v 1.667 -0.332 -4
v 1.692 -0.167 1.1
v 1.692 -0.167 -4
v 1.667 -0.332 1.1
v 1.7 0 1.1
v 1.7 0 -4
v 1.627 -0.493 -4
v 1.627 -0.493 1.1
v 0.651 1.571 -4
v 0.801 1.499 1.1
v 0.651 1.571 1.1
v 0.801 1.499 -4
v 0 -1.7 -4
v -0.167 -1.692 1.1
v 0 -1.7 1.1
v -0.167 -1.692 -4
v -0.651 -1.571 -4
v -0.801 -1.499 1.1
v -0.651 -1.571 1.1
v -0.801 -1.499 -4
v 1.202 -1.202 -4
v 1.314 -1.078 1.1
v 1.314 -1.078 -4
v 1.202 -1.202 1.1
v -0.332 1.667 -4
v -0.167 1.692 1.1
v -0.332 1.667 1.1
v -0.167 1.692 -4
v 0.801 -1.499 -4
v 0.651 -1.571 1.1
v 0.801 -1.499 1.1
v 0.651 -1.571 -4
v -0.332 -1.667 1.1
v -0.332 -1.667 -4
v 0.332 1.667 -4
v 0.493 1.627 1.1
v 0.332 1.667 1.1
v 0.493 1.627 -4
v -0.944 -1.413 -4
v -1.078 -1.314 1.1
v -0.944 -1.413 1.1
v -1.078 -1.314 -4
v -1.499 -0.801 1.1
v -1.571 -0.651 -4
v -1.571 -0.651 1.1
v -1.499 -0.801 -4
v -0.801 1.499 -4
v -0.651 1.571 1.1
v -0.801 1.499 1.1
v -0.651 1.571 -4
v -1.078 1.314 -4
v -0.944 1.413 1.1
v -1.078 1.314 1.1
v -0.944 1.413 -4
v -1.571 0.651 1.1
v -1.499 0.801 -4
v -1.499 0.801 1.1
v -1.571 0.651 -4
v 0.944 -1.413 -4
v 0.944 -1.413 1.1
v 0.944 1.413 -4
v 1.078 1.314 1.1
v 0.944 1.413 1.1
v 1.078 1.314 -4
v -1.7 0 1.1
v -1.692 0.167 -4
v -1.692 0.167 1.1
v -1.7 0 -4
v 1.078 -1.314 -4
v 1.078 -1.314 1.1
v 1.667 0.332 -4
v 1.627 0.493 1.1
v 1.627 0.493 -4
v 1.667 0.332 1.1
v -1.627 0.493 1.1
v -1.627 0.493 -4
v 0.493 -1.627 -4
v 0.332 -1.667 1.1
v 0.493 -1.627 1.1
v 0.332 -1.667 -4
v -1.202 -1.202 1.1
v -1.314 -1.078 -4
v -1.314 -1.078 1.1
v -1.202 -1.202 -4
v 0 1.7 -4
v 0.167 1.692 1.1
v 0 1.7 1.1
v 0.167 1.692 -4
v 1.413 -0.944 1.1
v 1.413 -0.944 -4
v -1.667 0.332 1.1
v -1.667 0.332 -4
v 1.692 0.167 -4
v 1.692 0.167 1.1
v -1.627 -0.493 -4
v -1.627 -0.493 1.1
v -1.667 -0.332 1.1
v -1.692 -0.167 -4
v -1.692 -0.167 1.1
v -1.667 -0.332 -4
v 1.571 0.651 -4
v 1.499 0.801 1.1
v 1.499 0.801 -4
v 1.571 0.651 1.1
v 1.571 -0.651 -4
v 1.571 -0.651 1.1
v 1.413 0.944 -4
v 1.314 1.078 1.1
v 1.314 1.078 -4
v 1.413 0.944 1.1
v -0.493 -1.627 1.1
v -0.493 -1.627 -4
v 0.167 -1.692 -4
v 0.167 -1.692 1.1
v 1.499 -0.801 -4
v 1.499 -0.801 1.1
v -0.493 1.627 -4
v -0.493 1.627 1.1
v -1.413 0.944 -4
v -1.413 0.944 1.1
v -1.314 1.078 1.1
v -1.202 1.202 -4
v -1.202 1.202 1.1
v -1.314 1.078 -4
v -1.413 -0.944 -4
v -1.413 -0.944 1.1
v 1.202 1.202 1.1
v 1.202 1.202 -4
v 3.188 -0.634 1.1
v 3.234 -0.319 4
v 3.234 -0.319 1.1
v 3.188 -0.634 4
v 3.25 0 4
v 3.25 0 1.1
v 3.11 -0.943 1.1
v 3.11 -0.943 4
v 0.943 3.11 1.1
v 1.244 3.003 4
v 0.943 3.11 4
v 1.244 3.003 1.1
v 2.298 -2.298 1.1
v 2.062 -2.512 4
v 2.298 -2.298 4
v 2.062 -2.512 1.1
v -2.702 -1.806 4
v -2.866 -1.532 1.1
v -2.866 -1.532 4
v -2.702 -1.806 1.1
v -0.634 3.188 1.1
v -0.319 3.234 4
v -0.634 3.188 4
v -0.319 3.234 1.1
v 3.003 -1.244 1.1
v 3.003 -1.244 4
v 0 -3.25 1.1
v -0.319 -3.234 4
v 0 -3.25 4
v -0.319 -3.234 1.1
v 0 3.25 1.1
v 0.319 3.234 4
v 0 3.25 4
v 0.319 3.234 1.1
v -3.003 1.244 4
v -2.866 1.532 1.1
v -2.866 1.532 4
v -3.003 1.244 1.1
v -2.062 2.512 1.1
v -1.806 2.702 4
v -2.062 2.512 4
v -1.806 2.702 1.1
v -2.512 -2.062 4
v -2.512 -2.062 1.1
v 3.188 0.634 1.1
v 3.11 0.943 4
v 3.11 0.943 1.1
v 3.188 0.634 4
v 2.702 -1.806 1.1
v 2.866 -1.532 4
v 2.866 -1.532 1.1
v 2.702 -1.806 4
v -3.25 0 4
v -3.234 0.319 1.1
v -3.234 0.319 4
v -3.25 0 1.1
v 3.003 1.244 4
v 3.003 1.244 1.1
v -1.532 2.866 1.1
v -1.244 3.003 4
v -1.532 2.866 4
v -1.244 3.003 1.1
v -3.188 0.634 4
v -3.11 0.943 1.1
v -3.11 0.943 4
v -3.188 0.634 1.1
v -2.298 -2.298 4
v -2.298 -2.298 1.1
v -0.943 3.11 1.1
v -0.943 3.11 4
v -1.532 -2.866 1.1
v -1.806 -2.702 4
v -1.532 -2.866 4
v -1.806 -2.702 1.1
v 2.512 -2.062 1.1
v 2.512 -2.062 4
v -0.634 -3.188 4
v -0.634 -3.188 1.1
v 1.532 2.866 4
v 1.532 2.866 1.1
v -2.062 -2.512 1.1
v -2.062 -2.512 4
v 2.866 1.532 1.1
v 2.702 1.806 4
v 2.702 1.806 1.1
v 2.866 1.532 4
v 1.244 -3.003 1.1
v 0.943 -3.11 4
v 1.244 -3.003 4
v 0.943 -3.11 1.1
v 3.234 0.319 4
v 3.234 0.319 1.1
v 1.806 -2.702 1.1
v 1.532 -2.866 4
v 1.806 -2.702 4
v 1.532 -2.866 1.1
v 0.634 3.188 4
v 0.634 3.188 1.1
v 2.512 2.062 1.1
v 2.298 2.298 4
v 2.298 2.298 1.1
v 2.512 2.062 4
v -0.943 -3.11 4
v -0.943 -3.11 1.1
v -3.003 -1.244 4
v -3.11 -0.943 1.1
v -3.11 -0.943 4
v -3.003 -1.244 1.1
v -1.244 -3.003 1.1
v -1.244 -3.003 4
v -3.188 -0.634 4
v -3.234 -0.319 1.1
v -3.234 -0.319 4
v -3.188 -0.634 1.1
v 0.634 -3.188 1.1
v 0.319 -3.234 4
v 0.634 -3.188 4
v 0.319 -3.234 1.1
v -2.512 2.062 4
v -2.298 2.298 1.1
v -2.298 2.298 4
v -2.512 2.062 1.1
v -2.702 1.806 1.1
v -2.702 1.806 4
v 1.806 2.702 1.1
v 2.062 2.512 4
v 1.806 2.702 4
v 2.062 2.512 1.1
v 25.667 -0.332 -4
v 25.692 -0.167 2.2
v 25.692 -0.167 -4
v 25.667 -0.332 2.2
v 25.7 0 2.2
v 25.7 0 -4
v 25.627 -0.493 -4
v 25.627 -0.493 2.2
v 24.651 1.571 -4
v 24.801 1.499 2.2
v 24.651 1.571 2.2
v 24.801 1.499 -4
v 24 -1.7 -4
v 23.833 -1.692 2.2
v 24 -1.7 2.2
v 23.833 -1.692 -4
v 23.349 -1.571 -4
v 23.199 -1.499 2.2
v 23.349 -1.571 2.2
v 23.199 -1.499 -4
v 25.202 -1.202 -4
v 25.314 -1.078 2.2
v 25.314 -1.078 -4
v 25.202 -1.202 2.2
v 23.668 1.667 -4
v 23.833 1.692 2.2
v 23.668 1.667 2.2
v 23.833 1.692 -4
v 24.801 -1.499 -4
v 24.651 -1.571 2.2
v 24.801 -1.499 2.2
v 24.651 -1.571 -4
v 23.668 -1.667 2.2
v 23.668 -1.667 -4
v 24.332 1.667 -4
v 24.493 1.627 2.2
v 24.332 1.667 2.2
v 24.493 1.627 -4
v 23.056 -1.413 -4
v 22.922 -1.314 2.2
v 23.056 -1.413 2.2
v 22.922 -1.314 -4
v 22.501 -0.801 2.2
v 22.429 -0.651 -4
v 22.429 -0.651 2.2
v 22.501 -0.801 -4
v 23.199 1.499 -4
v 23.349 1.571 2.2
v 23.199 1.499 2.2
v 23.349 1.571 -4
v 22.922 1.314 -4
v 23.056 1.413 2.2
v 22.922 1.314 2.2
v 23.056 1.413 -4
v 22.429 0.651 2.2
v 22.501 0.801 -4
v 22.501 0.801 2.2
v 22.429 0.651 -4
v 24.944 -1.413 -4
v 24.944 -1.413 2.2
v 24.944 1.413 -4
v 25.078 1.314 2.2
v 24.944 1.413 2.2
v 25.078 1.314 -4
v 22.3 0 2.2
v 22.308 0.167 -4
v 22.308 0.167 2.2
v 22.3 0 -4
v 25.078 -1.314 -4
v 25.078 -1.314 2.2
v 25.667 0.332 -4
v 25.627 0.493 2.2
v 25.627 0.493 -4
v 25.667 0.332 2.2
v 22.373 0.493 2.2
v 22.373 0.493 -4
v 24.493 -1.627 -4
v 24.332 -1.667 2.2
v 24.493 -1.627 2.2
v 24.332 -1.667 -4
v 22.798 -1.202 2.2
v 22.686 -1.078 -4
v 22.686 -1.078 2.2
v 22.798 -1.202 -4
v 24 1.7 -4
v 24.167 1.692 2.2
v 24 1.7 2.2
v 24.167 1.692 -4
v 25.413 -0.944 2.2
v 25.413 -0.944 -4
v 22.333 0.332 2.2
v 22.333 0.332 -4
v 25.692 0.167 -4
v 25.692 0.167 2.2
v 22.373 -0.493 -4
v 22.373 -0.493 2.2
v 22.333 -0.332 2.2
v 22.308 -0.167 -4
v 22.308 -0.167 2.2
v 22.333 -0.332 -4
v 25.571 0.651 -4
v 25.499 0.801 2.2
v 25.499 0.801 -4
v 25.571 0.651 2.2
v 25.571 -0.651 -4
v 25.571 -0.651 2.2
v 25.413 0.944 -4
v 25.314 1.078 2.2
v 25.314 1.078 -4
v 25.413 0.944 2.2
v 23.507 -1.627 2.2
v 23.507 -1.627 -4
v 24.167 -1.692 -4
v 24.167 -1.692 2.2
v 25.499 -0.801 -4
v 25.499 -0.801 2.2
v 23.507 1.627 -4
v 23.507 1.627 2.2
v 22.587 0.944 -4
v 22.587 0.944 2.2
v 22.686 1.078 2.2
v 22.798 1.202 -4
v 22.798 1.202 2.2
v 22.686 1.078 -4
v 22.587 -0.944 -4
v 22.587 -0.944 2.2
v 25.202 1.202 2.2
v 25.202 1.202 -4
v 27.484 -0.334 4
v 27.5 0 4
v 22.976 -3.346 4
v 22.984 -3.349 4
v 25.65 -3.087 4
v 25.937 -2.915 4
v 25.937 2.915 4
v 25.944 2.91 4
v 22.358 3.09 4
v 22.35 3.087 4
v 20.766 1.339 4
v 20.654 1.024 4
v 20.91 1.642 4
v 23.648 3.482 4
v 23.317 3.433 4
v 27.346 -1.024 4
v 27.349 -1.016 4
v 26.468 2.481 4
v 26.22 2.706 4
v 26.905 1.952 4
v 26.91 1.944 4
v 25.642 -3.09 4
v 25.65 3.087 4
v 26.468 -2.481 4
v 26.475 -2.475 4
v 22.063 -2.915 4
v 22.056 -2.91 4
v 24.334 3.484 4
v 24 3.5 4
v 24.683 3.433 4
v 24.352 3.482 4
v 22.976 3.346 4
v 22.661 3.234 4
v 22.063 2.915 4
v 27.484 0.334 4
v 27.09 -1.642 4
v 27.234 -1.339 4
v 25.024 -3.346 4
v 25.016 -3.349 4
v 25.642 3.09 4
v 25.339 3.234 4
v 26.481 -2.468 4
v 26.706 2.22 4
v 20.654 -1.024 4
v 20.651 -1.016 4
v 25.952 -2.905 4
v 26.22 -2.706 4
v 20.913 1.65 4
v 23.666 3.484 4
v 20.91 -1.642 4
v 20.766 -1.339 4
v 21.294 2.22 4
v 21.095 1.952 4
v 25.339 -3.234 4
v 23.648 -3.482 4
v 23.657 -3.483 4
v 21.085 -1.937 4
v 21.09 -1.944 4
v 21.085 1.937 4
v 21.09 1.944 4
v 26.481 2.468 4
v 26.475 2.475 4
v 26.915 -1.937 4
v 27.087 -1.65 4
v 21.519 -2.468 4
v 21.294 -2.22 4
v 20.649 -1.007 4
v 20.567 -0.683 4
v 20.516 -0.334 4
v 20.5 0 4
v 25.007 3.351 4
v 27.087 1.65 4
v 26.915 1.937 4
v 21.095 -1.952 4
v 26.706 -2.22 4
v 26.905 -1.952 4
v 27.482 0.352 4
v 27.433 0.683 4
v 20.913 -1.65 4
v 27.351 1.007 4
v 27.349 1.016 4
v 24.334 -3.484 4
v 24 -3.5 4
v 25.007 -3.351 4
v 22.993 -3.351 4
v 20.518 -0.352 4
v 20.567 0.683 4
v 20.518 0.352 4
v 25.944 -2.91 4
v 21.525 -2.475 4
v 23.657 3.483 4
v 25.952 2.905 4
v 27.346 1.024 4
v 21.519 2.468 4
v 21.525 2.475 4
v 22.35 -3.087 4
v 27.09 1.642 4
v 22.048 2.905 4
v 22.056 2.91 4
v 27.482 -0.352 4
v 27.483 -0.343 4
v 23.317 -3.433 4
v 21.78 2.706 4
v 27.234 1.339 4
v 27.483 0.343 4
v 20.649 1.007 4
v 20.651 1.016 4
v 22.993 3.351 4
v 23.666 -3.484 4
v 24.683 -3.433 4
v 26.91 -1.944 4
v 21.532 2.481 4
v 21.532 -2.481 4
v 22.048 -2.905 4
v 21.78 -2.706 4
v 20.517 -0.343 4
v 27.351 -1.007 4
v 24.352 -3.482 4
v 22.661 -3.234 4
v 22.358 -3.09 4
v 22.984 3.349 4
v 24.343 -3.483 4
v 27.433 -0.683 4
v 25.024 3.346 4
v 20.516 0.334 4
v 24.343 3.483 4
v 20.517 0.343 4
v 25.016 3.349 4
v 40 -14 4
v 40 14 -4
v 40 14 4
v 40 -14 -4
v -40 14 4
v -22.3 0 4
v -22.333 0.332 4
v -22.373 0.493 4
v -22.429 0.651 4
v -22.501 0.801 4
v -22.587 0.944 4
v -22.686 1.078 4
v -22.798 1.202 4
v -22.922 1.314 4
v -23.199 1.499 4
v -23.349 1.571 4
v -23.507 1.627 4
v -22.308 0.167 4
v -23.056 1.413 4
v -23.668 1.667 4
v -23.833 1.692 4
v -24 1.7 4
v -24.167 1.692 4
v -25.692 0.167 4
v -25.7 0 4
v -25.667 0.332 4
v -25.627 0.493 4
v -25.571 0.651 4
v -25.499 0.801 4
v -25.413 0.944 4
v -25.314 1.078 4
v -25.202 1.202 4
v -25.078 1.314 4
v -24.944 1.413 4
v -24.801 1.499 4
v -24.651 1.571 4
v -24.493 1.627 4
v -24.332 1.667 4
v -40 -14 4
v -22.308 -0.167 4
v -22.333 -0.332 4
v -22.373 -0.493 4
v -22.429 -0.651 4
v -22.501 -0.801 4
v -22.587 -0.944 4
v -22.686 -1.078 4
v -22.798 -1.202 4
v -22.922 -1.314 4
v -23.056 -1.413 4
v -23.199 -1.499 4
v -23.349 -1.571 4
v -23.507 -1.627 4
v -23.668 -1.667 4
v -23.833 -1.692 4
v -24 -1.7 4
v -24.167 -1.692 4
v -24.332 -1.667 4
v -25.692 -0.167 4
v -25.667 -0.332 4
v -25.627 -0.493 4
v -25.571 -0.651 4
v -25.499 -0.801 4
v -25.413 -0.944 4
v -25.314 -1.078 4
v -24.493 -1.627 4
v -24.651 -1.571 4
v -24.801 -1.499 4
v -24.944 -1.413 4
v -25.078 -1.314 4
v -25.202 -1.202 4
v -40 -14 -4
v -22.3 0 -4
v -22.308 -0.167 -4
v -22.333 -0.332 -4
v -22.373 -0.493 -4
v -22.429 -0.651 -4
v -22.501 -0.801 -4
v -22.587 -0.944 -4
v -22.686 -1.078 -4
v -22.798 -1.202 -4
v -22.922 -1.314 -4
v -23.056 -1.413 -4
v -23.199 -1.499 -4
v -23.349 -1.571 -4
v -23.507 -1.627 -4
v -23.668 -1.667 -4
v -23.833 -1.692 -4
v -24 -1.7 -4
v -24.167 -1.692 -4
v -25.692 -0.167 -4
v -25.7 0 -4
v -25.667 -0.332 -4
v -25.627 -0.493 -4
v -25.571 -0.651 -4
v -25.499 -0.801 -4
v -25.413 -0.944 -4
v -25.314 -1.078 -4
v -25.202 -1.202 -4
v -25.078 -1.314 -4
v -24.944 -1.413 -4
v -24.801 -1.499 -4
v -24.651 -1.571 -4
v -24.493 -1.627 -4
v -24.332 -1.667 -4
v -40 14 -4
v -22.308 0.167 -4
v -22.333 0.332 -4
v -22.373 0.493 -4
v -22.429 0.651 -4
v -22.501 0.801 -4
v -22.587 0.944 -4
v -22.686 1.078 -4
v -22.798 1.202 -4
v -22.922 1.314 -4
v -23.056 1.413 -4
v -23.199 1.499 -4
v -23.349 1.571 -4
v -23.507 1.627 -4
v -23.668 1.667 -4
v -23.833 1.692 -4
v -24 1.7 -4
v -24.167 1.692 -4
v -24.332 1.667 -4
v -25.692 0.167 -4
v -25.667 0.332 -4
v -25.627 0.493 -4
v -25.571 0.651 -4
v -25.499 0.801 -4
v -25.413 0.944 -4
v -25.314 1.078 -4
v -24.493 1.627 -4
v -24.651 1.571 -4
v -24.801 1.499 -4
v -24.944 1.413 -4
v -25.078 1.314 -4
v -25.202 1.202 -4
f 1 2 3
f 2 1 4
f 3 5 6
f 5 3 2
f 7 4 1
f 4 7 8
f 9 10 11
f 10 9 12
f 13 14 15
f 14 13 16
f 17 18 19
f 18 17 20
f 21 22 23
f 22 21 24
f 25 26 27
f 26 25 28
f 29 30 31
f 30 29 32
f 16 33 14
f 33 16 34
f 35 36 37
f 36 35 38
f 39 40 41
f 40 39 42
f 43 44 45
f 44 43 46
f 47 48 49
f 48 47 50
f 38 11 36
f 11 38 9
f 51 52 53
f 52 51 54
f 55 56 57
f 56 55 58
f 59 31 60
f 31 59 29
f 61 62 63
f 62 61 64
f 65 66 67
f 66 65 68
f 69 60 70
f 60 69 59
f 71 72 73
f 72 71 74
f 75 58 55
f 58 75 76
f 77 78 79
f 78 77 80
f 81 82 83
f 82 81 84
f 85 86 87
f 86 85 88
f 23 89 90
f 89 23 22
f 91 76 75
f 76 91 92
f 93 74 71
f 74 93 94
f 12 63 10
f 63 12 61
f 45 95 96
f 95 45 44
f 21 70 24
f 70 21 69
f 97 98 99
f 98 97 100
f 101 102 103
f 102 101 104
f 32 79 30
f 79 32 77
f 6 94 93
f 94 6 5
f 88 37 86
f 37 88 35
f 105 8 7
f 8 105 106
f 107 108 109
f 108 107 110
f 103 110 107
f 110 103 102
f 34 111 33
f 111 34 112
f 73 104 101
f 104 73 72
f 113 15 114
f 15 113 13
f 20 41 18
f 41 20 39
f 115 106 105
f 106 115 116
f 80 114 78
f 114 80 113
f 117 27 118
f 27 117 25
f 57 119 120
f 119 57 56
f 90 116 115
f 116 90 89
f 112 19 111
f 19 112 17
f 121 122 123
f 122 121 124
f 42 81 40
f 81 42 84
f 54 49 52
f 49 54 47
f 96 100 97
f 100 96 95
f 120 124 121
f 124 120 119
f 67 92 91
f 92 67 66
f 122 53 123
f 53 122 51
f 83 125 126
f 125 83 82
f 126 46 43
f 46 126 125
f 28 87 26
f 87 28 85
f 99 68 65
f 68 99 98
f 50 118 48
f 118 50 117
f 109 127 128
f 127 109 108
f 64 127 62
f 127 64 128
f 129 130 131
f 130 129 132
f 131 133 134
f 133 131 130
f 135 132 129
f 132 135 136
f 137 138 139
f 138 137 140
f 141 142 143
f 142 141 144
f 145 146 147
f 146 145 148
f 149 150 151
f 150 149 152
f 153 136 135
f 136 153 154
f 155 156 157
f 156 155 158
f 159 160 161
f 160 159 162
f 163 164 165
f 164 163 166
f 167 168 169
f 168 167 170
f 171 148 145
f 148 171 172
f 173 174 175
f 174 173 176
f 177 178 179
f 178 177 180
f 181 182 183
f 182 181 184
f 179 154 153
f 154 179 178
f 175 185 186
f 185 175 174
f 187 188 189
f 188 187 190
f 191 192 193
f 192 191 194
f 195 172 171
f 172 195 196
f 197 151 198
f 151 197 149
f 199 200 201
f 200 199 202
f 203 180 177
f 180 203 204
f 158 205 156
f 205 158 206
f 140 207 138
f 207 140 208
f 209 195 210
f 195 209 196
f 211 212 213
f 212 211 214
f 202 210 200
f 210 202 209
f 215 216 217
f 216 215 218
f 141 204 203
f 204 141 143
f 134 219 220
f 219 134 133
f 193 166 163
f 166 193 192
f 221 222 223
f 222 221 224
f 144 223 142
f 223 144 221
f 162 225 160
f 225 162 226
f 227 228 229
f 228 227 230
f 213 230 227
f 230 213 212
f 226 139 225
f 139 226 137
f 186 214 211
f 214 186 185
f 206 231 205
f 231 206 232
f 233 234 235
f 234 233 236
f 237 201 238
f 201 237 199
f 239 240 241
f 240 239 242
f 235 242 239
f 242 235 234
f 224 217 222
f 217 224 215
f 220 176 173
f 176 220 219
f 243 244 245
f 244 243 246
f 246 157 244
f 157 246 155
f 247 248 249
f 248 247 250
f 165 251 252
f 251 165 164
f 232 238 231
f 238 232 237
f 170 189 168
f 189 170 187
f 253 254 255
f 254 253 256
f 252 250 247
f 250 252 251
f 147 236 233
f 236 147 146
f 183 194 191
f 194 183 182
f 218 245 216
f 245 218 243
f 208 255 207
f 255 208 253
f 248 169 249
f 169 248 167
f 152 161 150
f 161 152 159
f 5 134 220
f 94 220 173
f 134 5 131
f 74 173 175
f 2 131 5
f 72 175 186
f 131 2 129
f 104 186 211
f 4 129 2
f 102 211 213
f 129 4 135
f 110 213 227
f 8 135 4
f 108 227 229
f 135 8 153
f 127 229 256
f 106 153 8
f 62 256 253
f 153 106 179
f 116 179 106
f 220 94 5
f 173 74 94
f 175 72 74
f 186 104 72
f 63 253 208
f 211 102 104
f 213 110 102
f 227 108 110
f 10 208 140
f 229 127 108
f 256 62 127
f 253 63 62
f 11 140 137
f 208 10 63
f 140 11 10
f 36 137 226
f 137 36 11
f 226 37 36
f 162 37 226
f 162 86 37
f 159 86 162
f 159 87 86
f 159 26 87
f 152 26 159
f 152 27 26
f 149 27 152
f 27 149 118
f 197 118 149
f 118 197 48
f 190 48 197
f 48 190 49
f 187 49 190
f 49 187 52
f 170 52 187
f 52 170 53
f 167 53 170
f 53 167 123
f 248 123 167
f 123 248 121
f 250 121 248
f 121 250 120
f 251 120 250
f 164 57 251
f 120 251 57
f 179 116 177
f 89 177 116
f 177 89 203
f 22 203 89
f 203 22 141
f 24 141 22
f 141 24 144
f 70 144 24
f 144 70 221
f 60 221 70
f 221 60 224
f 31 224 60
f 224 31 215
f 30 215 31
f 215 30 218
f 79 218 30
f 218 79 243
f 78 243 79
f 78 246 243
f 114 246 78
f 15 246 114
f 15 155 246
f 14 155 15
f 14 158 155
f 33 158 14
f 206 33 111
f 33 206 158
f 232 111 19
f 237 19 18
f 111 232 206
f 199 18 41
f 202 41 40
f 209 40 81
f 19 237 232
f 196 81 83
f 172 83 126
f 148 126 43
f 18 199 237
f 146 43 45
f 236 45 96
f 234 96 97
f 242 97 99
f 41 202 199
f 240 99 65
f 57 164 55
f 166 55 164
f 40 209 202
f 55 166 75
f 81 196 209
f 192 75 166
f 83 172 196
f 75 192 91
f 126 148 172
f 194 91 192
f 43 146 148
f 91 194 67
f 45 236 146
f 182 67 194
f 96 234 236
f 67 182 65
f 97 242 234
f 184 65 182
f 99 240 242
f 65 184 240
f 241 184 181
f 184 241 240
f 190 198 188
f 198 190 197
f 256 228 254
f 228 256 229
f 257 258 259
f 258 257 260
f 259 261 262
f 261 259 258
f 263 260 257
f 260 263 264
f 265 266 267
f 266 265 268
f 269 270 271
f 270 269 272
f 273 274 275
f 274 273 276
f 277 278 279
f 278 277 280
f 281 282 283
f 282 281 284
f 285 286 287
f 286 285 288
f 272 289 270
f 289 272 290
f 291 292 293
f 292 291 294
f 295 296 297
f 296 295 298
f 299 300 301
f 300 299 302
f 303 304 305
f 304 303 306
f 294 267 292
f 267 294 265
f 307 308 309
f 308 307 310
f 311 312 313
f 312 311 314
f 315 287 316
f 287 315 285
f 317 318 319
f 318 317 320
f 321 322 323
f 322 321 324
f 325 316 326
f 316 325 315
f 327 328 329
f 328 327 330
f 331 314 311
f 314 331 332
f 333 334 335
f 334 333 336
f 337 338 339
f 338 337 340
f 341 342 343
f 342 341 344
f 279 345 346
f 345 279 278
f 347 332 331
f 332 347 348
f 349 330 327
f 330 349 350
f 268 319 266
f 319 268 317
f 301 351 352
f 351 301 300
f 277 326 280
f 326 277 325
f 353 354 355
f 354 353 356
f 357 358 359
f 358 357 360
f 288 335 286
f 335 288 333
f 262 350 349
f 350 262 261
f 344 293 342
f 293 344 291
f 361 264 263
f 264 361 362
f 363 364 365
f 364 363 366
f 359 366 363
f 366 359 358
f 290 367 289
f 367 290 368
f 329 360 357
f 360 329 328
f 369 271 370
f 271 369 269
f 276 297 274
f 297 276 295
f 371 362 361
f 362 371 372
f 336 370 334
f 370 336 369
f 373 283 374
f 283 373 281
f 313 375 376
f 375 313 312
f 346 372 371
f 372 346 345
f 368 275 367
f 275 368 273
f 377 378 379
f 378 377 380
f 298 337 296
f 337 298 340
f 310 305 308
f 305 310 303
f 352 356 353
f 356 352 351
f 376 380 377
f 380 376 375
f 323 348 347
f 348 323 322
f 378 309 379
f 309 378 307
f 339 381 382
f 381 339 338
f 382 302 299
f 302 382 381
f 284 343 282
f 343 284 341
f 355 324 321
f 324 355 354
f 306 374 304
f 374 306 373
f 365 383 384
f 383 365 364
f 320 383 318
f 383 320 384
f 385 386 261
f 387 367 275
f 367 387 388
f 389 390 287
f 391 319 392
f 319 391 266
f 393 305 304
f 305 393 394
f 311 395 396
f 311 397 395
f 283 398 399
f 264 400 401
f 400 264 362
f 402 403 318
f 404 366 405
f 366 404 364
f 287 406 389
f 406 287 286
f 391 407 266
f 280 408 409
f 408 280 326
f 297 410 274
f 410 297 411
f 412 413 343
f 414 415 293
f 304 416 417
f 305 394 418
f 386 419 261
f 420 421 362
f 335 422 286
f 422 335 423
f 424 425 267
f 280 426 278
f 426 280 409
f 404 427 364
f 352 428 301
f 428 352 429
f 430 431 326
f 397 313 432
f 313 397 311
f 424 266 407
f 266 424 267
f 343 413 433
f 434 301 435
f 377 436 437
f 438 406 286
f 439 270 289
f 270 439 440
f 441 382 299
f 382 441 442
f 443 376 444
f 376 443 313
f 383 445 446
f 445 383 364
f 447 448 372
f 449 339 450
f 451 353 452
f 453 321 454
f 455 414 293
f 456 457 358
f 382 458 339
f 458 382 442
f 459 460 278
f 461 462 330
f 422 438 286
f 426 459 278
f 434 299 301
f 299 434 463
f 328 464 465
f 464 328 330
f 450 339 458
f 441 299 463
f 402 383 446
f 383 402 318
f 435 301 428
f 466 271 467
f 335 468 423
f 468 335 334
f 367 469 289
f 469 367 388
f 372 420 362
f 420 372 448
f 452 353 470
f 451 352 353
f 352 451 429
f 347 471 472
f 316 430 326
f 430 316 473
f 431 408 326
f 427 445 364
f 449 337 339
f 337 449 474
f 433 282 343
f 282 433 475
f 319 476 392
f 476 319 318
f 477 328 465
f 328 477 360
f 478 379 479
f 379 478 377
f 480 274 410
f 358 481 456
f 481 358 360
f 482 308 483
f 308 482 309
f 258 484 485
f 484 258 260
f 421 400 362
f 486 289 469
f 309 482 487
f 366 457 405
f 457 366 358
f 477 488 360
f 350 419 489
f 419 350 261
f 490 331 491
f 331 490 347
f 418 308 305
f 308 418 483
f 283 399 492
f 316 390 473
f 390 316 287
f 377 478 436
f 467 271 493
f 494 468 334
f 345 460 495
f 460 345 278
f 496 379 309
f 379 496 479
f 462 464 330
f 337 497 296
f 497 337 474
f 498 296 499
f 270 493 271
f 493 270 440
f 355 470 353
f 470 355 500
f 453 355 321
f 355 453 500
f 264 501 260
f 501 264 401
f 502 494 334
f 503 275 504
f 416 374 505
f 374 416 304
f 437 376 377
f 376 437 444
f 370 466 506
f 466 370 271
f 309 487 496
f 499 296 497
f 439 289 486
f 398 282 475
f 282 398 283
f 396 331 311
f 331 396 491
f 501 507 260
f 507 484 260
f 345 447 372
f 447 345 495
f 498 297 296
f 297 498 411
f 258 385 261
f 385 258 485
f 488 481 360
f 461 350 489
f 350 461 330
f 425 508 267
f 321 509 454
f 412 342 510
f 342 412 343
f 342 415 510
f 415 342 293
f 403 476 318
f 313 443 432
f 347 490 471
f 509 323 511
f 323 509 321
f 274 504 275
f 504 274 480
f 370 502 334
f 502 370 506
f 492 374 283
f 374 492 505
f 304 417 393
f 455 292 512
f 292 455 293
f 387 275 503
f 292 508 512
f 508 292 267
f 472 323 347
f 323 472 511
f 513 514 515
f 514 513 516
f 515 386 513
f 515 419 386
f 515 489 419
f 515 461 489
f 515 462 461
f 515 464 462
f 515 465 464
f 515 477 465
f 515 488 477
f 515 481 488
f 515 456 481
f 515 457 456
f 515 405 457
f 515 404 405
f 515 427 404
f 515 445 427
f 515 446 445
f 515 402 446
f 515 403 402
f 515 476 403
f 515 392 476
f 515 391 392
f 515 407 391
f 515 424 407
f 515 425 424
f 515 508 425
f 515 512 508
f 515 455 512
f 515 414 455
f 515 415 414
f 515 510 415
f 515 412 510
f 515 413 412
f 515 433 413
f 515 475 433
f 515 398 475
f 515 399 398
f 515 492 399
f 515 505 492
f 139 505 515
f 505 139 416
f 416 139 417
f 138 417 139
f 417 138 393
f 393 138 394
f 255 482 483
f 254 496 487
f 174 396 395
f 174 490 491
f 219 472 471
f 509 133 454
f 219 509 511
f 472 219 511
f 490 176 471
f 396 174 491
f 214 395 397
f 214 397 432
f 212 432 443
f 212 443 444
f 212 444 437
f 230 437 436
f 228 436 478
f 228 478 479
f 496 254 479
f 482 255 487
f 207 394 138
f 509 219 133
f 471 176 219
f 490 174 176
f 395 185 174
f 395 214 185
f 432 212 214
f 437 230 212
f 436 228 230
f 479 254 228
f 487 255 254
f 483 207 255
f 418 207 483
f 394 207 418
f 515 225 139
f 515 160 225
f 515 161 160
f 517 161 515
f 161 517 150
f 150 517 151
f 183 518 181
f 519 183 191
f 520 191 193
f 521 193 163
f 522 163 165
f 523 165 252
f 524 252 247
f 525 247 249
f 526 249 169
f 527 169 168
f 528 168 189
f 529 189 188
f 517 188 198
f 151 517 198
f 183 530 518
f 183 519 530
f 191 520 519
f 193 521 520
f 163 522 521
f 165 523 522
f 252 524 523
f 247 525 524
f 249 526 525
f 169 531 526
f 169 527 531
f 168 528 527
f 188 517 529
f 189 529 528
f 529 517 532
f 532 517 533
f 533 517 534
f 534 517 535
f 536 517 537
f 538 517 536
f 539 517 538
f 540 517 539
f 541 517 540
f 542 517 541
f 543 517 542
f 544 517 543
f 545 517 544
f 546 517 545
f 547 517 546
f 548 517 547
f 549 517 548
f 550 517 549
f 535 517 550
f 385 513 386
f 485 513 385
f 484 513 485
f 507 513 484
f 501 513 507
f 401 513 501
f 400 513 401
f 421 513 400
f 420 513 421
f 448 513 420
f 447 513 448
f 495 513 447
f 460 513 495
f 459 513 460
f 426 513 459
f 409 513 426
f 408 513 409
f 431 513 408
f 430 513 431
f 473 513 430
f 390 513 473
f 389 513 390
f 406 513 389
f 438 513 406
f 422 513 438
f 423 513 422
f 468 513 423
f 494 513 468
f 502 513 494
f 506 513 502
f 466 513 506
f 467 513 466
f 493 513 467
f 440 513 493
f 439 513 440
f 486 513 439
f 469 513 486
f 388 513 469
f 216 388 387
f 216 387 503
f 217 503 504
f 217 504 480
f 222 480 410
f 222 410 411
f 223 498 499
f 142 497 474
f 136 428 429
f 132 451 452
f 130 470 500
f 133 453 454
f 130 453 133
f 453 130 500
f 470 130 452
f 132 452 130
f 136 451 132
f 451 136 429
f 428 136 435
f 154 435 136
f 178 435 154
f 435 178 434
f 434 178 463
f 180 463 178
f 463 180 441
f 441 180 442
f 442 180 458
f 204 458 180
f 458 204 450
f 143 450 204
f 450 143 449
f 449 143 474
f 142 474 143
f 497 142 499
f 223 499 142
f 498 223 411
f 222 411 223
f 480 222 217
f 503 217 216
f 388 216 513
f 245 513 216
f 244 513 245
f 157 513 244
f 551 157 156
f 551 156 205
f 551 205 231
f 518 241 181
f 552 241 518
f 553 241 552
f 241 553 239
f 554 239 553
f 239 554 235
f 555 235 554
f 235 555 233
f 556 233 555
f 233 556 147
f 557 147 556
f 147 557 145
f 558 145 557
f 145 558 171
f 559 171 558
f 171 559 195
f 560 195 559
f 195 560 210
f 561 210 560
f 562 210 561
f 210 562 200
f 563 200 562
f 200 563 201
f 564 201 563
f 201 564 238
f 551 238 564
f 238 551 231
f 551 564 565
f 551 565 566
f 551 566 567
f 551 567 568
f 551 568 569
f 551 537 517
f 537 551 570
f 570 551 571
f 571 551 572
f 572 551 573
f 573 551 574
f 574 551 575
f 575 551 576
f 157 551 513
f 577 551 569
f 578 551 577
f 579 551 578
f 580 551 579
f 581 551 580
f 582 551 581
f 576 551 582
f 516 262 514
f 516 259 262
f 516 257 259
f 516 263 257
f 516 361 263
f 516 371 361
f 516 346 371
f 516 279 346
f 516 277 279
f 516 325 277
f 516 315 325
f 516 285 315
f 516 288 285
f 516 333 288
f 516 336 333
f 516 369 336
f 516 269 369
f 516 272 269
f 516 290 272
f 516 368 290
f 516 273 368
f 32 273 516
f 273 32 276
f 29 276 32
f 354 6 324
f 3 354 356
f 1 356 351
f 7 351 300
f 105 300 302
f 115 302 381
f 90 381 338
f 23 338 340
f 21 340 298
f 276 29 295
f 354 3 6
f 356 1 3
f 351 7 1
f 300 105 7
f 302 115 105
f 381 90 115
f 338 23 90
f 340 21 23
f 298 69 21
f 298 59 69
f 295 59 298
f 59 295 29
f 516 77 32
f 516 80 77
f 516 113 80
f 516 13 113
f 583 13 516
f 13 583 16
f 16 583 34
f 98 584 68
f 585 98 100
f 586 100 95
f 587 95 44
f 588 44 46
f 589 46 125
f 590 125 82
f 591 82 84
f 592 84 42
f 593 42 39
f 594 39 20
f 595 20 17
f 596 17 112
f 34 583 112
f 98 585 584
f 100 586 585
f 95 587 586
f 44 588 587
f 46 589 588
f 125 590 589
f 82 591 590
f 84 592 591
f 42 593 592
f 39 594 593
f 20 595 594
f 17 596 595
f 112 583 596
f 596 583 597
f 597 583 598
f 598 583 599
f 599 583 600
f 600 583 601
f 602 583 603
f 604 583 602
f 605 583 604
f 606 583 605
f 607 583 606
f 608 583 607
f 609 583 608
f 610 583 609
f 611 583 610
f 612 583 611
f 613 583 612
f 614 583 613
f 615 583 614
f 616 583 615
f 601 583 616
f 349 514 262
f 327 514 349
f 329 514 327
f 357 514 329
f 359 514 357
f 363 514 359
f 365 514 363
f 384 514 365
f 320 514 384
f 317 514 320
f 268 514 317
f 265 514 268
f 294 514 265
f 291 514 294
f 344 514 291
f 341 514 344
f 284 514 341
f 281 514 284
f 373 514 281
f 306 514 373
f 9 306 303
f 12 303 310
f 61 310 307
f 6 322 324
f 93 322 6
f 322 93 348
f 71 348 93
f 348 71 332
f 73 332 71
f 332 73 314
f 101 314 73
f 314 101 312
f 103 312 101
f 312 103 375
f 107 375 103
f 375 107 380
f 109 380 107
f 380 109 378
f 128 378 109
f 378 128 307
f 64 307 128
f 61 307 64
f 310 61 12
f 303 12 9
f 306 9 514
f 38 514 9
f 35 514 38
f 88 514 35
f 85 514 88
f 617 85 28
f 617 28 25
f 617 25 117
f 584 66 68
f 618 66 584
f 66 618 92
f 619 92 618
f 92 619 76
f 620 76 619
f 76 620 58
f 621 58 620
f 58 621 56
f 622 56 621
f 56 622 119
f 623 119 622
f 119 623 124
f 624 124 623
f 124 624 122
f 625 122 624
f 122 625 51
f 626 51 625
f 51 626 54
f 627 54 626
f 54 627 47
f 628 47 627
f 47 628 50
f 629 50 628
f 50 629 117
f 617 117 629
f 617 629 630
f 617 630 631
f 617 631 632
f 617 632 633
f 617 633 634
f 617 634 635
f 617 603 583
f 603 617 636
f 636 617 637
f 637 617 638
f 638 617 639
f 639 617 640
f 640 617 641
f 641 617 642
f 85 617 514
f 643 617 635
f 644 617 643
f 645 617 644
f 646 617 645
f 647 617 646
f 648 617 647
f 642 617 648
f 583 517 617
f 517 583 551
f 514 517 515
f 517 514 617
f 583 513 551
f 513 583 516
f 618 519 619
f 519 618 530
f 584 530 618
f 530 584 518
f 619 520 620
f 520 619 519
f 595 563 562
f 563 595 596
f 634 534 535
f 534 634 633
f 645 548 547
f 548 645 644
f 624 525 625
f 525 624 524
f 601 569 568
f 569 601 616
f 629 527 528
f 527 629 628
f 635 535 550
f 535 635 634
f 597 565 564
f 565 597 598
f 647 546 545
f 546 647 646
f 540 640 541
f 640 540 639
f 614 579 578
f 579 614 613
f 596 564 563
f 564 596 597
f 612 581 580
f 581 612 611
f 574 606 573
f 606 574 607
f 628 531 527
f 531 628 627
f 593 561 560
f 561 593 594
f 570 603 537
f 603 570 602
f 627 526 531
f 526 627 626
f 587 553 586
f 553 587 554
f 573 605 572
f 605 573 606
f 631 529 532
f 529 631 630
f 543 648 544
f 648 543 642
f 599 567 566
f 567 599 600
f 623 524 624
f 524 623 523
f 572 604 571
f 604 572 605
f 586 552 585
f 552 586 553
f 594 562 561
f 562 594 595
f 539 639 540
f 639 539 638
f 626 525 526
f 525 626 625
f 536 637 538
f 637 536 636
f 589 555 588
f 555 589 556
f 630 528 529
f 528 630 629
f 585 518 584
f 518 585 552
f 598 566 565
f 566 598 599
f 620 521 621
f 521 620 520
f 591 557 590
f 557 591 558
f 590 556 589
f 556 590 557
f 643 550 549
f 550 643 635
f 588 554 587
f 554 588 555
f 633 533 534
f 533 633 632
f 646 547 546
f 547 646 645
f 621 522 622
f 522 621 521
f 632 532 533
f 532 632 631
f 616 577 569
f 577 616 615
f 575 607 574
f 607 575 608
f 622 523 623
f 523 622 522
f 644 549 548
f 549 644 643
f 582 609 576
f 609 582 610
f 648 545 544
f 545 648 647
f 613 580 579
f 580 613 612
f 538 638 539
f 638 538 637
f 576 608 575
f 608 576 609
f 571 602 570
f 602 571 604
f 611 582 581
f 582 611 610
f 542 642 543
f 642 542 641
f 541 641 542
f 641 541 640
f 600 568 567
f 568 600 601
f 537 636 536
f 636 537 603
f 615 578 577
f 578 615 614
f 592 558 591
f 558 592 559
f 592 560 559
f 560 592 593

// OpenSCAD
// Screw Hole Sampler
plate_size = [80, 28, 8];
clearance_diameter = 3.4;
counterbore_diameter = 6.5;
counterbore_depth = 3;
countersink_diameter = 7.2;

$fn = 64;

module screw_clearance_hole(length, d) {
  cylinder(h = length, d = d);
}

module screw_counterbore(length, clearance_d, bore_d, bore_depth) {
  union() {
    cylinder(h = length, d = clearance_d);
    cylinder(h = bore_depth, d = bore_d);
  }
}

module screw_countersink(length, clearance_d, sink_d) {
  union() {
    cylinder(h = length, d = clearance_d);
    cylinder(h = (sink_d - clearance_d) / 2, d1 = sink_d, d2 = clearance_d);
  }
}

difference() {
  cube(plate_size, center = true);

  translate([-24, 0, -plate_size[2] / 2 - 0.1]) {
    screw_clearance_hole(plate_size[2] + 0.2, clearance_diameter);
  }

  translate([0, 0, plate_size[2] / 2 + 0.1]) rotate([180, 0, 0]) {
    screw_counterbore(plate_size[2] + 0.2, clearance_diameter, counterbore_diameter, counterbore_depth);
  }

  translate([24, 0, plate_size[2] / 2 + 0.1]) rotate([180, 0, 0]) {
    screw_countersink(plate_size[2] + 0.2, clearance_diameter, countersink_diameter);
  }
}
